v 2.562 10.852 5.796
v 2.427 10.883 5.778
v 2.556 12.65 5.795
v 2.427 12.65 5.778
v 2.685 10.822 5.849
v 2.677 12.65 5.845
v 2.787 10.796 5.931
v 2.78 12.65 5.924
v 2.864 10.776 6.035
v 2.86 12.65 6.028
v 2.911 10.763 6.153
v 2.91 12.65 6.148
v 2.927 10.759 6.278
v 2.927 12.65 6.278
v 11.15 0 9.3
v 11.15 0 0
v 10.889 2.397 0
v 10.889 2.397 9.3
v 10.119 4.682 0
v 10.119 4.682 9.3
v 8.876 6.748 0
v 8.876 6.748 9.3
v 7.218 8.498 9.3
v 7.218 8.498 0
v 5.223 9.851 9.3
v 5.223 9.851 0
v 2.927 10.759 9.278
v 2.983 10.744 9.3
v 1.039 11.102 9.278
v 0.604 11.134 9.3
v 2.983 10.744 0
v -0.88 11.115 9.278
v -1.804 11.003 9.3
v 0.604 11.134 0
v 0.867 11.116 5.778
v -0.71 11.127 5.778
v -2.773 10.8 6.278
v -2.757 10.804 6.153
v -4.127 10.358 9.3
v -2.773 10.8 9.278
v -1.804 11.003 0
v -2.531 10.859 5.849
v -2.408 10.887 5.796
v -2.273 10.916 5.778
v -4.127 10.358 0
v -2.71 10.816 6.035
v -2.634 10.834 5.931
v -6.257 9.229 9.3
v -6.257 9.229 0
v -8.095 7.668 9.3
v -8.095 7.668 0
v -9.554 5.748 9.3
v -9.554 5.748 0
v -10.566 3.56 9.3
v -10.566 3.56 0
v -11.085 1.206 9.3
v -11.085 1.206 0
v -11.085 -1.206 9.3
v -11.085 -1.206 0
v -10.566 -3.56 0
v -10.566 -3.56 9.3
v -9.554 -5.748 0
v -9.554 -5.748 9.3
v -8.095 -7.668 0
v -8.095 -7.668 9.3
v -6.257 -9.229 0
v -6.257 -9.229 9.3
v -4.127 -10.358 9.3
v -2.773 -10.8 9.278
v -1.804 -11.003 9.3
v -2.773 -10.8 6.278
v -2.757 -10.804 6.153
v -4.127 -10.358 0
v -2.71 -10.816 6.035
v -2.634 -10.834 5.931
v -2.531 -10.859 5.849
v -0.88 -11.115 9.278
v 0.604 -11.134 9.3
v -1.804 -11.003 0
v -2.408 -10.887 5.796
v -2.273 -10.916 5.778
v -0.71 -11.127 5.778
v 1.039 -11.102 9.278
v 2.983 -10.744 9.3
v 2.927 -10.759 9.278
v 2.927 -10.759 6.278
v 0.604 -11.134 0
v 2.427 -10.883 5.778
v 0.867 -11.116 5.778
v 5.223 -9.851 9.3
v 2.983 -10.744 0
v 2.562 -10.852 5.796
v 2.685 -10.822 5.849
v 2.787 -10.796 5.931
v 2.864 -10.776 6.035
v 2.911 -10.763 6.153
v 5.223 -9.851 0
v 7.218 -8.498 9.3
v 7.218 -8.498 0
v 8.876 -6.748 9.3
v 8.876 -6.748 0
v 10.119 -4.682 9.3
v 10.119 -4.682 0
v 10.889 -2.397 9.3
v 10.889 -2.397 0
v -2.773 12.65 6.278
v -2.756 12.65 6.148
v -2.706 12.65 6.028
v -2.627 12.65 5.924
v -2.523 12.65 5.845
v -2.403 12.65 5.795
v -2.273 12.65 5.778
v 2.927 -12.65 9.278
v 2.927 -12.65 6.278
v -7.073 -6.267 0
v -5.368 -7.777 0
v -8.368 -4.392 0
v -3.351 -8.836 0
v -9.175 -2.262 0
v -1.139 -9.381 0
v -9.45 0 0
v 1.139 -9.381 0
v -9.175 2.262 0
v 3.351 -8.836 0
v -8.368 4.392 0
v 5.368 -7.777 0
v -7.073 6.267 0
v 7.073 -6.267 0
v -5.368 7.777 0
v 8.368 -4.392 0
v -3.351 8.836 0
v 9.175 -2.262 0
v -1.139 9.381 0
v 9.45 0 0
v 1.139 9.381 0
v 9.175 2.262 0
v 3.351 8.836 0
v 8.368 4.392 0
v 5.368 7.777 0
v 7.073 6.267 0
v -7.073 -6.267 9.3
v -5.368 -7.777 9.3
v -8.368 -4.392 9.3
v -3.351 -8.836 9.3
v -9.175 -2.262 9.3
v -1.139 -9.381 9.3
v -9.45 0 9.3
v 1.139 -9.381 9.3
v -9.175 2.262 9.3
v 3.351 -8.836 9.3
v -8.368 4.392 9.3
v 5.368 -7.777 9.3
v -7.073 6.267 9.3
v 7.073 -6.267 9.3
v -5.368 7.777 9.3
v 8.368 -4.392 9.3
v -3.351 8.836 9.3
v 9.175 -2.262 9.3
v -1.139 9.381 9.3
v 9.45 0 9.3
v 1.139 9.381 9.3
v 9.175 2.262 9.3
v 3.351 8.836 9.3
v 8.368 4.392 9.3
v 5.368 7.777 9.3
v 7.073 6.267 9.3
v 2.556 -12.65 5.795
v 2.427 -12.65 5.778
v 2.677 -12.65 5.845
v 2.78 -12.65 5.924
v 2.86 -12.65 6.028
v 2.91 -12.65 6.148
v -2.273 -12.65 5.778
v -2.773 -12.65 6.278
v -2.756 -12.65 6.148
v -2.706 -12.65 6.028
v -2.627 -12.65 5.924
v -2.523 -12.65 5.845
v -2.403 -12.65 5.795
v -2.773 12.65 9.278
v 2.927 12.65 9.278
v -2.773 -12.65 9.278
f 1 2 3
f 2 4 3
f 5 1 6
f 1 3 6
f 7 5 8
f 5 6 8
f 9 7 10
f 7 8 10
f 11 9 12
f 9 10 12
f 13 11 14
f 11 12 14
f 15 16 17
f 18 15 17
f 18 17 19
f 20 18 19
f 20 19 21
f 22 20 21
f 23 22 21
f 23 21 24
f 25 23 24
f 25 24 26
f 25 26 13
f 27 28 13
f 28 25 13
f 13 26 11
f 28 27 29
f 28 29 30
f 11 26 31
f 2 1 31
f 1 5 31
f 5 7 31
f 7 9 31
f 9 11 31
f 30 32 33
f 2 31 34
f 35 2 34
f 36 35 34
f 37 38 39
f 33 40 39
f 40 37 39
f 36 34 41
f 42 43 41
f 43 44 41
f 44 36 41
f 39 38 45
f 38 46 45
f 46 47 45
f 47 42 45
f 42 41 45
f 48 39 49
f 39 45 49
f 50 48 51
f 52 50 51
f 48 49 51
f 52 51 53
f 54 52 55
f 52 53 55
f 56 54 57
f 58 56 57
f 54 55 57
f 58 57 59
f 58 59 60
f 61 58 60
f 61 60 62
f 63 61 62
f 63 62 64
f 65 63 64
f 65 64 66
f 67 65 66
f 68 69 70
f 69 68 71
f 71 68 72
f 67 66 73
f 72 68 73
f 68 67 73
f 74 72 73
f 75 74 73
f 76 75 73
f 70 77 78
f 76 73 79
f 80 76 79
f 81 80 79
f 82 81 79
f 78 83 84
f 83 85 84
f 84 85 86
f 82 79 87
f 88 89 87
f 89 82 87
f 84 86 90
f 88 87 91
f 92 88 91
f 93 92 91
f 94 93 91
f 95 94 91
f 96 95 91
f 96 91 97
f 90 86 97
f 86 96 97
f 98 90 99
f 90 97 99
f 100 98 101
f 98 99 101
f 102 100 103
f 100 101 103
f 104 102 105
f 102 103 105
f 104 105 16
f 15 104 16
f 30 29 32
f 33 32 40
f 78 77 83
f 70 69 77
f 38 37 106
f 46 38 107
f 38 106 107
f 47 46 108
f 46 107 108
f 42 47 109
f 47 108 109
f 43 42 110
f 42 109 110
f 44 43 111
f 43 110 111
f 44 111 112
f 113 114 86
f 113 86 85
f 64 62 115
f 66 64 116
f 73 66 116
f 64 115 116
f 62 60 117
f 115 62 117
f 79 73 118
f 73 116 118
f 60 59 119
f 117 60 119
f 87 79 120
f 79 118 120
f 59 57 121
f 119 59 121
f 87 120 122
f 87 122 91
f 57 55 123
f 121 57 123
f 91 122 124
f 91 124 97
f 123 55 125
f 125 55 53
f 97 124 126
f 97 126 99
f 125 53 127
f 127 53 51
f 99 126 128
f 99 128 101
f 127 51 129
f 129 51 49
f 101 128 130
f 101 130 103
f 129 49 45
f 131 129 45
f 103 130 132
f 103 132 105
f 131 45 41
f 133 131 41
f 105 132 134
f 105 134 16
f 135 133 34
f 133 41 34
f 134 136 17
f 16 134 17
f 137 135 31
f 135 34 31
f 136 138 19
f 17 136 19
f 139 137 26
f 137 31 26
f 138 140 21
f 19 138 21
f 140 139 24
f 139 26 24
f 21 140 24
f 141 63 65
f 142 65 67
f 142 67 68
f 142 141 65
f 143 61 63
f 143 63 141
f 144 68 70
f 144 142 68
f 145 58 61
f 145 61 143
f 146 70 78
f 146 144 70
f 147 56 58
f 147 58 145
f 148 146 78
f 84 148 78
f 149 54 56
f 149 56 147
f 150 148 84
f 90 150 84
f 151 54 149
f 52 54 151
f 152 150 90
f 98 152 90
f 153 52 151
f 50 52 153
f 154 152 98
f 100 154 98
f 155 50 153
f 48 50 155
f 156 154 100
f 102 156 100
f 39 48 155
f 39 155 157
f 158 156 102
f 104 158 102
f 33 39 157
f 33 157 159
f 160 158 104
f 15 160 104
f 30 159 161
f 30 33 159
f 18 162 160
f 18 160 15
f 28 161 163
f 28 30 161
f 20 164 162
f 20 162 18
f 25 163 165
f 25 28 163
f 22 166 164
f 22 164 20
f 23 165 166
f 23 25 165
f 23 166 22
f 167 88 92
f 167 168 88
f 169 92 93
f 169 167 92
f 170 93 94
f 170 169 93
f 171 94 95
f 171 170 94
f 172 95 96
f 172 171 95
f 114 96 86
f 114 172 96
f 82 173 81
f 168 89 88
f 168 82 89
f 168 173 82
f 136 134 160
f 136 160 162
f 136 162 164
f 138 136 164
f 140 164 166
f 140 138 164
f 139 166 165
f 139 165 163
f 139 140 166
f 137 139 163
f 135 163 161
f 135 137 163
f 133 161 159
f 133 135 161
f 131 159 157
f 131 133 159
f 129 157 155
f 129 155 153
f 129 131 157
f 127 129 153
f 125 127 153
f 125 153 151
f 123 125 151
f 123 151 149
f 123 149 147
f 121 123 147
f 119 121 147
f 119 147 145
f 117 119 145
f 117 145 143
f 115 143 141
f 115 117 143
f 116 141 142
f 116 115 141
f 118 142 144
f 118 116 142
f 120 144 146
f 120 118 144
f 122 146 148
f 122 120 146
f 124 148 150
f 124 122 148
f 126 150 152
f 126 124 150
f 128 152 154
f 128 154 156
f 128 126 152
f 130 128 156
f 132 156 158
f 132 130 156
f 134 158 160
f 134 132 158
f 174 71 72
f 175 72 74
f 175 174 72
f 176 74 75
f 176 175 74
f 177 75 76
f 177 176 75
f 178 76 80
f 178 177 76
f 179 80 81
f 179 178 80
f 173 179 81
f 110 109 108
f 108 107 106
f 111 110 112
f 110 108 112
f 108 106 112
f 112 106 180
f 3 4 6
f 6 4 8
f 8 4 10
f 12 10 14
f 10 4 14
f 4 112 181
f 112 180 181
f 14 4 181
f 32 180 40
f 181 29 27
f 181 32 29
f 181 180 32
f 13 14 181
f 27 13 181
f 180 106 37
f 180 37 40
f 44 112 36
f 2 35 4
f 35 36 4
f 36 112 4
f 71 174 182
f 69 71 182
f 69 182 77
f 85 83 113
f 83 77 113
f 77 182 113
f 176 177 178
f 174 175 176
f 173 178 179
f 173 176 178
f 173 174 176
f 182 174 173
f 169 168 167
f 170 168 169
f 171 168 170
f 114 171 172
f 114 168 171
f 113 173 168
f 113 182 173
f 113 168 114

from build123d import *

# Parameters (mm, degrees)
F0_R     = 11.15
F0_R_2   = 9.45
F1_DEPTH = 9.3
F3_W     = 5.7
F3_H     = 3.5
F4_DEPTH = 1.5
F5_R     = 0.5


with BuildPart() as f1:
    # F0 (on Top) → F1 (new body)
    with BuildSketch(Plane.XY):
        Circle(F0_R)
        Circle(F0_R_2, mode=Mode.SUBTRACT)
    extrude(amount=F1_DEPTH)

    # F3 (on offset) → F4 (join, symmetric)
    with BuildSketch(Plane.XZ.offset(11.15)):
        with Locations((0.0768768184, 7.5275215786)):
            Rectangle(F3_W, F3_H)
    extrude(amount=F4_DEPTH, both=True)

    # F5
    f5_edges = [f1.edges().sort_by_distance(p)[0] for p in [
        (-2.773123, -11.724821, 5.777522),
        (2.926877, -11.704496, 5.777522),
    ]]
    fillet(f5_edges, radius=F5_R)

    # F6: F1 across plane


with BuildPart() as f1_1:
    add(f1.part)
    add(f1.part.mirror(Plane.XZ))


solid = f1_1.part
